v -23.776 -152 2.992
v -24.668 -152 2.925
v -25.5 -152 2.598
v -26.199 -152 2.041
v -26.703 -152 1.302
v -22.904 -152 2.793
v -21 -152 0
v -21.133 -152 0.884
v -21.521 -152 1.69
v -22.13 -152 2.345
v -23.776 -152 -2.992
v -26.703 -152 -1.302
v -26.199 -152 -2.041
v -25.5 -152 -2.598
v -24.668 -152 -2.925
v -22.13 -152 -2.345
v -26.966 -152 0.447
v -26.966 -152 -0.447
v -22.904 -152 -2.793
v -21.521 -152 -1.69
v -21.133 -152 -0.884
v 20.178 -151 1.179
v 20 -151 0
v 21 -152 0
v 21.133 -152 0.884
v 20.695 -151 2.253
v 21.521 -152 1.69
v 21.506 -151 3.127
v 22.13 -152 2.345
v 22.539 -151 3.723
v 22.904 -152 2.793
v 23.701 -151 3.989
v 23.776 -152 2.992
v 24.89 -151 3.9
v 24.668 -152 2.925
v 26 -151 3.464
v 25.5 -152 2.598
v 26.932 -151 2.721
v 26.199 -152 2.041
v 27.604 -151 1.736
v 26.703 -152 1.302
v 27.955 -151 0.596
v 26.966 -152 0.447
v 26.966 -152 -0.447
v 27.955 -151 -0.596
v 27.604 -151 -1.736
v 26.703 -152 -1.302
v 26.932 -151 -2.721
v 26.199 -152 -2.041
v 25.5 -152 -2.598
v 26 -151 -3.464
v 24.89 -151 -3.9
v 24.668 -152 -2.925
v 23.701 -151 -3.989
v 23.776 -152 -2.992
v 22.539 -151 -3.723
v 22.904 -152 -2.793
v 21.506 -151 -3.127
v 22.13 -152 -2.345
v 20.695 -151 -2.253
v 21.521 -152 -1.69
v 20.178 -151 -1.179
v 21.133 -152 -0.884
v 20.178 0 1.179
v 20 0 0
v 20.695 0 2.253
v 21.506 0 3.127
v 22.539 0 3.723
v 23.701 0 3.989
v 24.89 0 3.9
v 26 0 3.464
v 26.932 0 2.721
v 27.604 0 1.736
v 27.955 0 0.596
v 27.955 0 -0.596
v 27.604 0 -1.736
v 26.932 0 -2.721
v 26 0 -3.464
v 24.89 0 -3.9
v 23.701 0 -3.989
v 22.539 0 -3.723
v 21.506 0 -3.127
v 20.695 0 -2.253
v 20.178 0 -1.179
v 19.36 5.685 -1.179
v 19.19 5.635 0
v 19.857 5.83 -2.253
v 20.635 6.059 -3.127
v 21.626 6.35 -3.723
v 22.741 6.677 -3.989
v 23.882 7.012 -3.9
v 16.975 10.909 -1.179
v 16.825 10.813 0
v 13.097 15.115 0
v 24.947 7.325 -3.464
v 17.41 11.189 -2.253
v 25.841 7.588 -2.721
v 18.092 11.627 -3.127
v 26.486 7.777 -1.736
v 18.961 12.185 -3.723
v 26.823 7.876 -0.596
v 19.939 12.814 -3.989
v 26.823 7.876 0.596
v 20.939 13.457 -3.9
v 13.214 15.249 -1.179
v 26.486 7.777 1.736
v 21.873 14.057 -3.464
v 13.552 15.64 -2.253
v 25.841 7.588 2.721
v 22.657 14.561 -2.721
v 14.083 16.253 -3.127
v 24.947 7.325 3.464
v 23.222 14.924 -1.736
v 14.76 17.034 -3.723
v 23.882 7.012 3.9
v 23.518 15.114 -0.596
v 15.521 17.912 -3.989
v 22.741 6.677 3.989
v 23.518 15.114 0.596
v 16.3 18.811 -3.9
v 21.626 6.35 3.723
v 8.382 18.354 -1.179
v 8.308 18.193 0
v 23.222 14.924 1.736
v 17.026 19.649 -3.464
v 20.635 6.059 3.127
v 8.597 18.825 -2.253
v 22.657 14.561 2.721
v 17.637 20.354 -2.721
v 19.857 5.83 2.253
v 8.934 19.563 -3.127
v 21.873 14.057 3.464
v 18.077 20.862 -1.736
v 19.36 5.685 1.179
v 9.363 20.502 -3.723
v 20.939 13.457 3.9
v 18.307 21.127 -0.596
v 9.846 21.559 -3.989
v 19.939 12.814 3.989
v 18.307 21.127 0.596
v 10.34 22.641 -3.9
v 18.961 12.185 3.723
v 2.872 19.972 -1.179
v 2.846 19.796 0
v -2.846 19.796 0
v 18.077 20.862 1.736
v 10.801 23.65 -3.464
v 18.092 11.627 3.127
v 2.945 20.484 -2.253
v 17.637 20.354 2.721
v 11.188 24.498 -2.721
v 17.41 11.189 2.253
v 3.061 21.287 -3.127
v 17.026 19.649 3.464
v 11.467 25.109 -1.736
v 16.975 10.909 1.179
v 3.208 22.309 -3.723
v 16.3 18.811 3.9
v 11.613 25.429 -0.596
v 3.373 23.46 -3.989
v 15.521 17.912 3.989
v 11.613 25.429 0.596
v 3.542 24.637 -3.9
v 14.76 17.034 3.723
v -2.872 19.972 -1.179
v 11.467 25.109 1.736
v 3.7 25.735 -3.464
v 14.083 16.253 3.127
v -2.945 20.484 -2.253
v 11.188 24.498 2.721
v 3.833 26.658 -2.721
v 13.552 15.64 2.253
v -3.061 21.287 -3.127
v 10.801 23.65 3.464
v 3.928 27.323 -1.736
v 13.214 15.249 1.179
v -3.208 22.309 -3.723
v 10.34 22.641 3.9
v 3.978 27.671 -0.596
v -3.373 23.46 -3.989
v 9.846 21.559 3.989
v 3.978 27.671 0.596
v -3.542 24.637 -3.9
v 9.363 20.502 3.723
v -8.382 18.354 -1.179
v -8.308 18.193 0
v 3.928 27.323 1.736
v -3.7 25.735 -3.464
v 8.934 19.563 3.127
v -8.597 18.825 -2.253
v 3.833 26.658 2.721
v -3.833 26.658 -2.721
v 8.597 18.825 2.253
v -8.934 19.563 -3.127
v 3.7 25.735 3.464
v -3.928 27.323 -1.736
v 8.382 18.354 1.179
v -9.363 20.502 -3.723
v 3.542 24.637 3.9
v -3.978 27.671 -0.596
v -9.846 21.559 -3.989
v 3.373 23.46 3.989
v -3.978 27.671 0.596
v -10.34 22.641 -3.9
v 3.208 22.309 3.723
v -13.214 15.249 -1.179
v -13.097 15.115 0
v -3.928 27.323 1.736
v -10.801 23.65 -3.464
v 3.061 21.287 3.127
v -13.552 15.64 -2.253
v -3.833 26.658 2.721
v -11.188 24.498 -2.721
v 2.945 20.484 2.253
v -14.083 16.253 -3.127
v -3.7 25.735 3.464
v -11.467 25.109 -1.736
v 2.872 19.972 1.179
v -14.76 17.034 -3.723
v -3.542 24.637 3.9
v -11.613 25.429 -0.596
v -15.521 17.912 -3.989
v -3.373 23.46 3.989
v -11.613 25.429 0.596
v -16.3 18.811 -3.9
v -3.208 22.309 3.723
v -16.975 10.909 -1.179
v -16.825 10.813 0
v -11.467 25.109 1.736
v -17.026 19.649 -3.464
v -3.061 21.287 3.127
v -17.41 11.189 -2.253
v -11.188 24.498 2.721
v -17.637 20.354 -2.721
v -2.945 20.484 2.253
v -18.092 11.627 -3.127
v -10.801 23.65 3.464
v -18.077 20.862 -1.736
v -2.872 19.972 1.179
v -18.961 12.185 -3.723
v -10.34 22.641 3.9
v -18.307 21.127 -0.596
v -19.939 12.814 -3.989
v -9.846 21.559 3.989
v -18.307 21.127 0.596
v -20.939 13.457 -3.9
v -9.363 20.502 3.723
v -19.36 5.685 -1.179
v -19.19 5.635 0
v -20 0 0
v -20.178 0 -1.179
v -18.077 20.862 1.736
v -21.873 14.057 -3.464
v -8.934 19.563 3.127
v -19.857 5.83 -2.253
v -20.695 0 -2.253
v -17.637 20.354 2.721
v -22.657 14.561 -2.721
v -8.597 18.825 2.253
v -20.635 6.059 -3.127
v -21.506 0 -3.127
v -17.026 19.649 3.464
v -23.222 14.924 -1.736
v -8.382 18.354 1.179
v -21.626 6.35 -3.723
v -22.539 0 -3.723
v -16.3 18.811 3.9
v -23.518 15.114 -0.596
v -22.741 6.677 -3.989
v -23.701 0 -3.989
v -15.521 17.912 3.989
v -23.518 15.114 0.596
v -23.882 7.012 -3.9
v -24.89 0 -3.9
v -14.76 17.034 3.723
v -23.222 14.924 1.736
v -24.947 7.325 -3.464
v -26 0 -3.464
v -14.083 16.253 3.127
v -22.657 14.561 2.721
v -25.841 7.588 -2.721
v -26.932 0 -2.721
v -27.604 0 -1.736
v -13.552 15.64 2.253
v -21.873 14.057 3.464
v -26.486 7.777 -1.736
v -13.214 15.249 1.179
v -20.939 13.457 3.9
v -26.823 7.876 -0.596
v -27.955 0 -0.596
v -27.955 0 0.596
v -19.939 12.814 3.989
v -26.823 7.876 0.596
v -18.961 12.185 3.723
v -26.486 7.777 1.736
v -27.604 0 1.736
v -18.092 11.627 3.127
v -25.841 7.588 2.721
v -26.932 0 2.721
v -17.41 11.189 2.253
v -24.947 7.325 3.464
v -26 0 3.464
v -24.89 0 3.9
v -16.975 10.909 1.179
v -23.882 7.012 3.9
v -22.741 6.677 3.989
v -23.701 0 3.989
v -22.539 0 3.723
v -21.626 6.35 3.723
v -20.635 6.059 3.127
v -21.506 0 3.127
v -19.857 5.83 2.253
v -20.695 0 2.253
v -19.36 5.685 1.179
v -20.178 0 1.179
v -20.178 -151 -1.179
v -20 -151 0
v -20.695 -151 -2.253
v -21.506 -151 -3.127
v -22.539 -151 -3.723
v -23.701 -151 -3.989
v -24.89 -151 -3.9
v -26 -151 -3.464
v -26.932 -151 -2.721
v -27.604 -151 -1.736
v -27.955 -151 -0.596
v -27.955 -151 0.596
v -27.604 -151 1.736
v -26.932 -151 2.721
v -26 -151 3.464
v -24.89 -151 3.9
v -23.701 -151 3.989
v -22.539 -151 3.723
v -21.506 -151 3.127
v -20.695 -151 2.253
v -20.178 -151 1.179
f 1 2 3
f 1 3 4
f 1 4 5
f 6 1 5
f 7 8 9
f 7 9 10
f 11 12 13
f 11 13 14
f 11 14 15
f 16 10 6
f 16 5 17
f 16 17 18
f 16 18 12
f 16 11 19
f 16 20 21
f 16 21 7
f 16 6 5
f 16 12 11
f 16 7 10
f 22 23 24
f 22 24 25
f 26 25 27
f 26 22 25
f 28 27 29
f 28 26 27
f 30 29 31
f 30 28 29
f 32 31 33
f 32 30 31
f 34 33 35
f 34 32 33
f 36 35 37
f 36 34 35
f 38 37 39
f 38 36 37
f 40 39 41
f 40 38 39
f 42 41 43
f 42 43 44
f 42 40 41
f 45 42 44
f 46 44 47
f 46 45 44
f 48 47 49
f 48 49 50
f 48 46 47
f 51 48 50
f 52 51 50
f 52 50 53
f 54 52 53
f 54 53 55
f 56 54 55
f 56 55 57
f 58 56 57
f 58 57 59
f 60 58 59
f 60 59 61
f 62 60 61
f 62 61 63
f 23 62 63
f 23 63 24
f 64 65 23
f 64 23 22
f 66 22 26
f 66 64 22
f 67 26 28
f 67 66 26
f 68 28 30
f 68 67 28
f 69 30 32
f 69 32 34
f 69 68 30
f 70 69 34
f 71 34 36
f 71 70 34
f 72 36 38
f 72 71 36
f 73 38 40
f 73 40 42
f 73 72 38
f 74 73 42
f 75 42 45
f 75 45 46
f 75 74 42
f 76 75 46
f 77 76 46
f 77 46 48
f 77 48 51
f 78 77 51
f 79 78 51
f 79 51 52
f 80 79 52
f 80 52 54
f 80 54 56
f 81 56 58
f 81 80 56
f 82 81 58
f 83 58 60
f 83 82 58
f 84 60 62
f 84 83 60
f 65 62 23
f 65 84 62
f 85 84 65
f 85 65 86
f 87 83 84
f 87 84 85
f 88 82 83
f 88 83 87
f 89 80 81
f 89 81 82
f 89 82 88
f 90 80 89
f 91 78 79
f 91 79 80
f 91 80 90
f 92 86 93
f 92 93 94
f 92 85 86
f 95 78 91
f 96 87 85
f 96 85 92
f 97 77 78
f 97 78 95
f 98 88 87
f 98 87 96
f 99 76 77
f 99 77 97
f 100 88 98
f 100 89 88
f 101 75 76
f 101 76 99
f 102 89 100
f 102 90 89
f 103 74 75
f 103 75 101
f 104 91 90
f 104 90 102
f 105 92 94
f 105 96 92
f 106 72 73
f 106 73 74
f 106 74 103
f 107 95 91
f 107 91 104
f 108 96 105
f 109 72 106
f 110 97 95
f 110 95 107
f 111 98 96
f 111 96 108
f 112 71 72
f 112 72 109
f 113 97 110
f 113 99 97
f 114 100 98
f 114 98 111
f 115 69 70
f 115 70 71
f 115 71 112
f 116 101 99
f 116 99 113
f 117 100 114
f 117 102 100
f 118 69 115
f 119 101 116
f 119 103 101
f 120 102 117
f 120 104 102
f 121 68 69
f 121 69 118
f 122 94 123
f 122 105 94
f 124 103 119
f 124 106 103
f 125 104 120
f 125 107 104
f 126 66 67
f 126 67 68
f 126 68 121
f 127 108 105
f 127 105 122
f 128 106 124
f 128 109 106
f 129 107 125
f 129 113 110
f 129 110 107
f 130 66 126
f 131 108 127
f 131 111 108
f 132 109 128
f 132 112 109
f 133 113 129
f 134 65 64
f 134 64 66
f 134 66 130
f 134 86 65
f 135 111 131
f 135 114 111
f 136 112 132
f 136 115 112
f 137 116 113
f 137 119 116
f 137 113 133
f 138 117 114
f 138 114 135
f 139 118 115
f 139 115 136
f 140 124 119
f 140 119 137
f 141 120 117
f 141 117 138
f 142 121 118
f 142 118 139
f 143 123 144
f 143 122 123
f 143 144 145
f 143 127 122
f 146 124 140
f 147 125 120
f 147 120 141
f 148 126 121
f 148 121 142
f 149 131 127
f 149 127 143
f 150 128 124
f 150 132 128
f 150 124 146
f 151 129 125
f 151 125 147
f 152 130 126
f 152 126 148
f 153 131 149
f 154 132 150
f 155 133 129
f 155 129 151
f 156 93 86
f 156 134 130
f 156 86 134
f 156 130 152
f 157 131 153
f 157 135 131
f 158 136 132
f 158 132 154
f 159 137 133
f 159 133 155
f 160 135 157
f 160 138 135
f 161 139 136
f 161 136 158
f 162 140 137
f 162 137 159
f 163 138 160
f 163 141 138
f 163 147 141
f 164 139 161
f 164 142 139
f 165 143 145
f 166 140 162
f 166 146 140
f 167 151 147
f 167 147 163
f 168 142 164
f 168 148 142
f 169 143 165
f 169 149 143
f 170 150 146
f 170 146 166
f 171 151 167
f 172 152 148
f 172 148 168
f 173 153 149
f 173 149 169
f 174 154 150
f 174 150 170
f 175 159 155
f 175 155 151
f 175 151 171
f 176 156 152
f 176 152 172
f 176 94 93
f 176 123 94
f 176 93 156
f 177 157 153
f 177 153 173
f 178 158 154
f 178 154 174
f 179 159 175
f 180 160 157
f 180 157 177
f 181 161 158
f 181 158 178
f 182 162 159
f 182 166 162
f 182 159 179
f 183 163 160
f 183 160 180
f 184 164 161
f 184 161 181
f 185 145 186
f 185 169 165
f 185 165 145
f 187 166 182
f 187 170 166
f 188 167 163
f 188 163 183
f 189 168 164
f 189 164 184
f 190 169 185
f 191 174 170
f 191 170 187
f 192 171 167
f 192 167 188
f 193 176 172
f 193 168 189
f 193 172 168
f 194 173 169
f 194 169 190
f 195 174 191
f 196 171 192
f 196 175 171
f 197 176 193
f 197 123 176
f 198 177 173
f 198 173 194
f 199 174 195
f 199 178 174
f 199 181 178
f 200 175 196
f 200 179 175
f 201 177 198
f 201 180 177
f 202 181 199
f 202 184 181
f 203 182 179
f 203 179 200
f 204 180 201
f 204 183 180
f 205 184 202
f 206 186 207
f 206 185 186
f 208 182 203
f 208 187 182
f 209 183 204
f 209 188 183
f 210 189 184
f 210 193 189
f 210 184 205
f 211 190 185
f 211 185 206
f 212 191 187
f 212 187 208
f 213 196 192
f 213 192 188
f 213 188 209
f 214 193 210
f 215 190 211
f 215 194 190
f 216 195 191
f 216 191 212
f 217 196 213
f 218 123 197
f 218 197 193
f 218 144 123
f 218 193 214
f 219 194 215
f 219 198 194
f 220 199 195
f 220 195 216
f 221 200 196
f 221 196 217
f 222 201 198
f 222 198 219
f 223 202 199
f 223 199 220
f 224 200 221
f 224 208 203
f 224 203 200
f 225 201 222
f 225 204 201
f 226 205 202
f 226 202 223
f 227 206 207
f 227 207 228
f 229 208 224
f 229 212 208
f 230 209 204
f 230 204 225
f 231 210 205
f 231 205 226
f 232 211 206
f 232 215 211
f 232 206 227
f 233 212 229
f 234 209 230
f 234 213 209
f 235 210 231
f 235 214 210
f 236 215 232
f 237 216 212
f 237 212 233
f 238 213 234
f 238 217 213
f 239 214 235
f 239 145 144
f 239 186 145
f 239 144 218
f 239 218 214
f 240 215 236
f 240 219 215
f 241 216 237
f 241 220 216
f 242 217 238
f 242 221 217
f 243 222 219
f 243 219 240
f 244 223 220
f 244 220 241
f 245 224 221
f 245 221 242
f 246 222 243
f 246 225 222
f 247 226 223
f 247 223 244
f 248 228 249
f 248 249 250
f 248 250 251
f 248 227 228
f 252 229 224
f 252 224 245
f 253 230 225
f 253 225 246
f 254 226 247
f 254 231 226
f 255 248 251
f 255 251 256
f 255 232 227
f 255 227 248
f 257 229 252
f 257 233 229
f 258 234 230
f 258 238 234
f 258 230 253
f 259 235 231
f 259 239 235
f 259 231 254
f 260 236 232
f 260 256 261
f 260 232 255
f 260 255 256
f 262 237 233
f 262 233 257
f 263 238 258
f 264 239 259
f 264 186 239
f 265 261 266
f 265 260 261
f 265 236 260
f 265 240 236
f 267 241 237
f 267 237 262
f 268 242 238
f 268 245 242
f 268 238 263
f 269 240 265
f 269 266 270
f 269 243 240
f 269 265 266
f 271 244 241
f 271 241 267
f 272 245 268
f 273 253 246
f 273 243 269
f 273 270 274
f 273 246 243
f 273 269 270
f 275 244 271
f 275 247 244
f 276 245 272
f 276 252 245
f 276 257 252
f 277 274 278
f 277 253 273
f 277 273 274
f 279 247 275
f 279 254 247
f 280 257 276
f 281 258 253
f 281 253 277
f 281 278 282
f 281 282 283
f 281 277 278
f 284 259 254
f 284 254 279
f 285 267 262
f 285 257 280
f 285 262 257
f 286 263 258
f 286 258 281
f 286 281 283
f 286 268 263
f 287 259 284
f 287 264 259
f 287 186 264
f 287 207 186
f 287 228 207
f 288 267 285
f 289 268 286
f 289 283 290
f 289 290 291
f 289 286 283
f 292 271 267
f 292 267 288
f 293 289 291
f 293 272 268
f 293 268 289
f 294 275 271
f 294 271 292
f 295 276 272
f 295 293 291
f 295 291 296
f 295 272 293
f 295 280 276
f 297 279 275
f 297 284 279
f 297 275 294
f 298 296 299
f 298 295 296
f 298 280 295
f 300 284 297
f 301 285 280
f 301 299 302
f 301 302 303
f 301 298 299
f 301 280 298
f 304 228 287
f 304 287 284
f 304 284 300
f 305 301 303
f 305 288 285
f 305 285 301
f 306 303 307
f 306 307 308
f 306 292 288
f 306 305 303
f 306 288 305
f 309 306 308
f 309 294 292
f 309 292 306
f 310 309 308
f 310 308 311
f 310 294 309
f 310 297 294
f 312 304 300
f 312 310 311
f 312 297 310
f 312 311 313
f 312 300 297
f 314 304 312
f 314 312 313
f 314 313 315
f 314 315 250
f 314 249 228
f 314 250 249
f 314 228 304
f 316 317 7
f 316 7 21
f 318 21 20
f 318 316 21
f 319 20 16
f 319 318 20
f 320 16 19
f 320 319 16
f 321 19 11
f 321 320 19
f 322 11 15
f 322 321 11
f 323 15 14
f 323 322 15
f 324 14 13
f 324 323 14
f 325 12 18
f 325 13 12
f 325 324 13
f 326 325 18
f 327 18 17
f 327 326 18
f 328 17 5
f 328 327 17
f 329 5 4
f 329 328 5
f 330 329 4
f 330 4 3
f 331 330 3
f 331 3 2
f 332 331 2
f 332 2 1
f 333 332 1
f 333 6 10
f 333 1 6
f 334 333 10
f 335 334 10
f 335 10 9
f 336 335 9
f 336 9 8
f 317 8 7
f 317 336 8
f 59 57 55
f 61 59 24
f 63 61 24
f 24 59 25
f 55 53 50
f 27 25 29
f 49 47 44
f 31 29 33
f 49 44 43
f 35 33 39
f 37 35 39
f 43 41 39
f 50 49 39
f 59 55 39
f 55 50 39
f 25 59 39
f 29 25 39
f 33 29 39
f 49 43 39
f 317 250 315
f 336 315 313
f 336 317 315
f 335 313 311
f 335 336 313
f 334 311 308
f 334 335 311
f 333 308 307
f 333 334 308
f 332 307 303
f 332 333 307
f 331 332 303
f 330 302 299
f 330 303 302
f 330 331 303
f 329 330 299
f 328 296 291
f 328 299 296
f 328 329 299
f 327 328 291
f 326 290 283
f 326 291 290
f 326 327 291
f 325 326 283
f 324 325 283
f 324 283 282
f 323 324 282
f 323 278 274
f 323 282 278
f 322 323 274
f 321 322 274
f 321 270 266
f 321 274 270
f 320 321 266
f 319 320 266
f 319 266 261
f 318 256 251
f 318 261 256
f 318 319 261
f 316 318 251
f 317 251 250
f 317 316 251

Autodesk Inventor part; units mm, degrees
ref_plane "YZ Plane" through (0, 0, 0) normal (1, 0, 0) x (0, 1, 0)
ref_plane "XZ Plane" through (0, 0, 0) normal (0, 1, 0) x (-1, 0, 0)
sketch "Sketch1" plane through (0, 0, 0) normal (0, 0, 1) x (1, 0, 0)
  arc A0 (24, 0) -> (-24, 0) centre (0, 0) ccw
  line L0 (-24, 0) -> (-24, -152)
  line L1 (24, 0) -> (24, -152)
  dimension "d0" = 48
  dimension "d1" = 152
ref_plane "Work Plane1" through (-24, -152, 0) normal (0, -1, 0) x (1, 0, 0)
sketch "Sketch2" plane through (-24, -152, 0) normal (0, -1, 0) x (1, 0, 0)
  circle A0 centre (0, 0) radius 4
  point P0 (24, 0)
  dimension "d2" = 8
sweep "Колебание1" add profiles "Sketch2" path "Sketch1"
thread "Резьба1"
thread "Резьба2"
chamfer "Фаска1" distance 1 angle 45 2 edges at (28, -152, 0) (-28, -152, 0)
equation "\"d0\" = D + d_"
equation "\"d1\" = -d_ + H_ - 0.5 * D"
equation "\"d2\" = d_"
equation "\"d4\" = l_"
equation "\"d11\" = l_"
equation "\"D\" = 40"
equation "\"A_\" = 136"
equation "\"d_\" = 8"
equation "\"l_\" = 60"
equation "\"H_\" = 180"
properties part number "Скоба 40x170 ГОСТ 24137-80" material "Сталь, мягкая"
